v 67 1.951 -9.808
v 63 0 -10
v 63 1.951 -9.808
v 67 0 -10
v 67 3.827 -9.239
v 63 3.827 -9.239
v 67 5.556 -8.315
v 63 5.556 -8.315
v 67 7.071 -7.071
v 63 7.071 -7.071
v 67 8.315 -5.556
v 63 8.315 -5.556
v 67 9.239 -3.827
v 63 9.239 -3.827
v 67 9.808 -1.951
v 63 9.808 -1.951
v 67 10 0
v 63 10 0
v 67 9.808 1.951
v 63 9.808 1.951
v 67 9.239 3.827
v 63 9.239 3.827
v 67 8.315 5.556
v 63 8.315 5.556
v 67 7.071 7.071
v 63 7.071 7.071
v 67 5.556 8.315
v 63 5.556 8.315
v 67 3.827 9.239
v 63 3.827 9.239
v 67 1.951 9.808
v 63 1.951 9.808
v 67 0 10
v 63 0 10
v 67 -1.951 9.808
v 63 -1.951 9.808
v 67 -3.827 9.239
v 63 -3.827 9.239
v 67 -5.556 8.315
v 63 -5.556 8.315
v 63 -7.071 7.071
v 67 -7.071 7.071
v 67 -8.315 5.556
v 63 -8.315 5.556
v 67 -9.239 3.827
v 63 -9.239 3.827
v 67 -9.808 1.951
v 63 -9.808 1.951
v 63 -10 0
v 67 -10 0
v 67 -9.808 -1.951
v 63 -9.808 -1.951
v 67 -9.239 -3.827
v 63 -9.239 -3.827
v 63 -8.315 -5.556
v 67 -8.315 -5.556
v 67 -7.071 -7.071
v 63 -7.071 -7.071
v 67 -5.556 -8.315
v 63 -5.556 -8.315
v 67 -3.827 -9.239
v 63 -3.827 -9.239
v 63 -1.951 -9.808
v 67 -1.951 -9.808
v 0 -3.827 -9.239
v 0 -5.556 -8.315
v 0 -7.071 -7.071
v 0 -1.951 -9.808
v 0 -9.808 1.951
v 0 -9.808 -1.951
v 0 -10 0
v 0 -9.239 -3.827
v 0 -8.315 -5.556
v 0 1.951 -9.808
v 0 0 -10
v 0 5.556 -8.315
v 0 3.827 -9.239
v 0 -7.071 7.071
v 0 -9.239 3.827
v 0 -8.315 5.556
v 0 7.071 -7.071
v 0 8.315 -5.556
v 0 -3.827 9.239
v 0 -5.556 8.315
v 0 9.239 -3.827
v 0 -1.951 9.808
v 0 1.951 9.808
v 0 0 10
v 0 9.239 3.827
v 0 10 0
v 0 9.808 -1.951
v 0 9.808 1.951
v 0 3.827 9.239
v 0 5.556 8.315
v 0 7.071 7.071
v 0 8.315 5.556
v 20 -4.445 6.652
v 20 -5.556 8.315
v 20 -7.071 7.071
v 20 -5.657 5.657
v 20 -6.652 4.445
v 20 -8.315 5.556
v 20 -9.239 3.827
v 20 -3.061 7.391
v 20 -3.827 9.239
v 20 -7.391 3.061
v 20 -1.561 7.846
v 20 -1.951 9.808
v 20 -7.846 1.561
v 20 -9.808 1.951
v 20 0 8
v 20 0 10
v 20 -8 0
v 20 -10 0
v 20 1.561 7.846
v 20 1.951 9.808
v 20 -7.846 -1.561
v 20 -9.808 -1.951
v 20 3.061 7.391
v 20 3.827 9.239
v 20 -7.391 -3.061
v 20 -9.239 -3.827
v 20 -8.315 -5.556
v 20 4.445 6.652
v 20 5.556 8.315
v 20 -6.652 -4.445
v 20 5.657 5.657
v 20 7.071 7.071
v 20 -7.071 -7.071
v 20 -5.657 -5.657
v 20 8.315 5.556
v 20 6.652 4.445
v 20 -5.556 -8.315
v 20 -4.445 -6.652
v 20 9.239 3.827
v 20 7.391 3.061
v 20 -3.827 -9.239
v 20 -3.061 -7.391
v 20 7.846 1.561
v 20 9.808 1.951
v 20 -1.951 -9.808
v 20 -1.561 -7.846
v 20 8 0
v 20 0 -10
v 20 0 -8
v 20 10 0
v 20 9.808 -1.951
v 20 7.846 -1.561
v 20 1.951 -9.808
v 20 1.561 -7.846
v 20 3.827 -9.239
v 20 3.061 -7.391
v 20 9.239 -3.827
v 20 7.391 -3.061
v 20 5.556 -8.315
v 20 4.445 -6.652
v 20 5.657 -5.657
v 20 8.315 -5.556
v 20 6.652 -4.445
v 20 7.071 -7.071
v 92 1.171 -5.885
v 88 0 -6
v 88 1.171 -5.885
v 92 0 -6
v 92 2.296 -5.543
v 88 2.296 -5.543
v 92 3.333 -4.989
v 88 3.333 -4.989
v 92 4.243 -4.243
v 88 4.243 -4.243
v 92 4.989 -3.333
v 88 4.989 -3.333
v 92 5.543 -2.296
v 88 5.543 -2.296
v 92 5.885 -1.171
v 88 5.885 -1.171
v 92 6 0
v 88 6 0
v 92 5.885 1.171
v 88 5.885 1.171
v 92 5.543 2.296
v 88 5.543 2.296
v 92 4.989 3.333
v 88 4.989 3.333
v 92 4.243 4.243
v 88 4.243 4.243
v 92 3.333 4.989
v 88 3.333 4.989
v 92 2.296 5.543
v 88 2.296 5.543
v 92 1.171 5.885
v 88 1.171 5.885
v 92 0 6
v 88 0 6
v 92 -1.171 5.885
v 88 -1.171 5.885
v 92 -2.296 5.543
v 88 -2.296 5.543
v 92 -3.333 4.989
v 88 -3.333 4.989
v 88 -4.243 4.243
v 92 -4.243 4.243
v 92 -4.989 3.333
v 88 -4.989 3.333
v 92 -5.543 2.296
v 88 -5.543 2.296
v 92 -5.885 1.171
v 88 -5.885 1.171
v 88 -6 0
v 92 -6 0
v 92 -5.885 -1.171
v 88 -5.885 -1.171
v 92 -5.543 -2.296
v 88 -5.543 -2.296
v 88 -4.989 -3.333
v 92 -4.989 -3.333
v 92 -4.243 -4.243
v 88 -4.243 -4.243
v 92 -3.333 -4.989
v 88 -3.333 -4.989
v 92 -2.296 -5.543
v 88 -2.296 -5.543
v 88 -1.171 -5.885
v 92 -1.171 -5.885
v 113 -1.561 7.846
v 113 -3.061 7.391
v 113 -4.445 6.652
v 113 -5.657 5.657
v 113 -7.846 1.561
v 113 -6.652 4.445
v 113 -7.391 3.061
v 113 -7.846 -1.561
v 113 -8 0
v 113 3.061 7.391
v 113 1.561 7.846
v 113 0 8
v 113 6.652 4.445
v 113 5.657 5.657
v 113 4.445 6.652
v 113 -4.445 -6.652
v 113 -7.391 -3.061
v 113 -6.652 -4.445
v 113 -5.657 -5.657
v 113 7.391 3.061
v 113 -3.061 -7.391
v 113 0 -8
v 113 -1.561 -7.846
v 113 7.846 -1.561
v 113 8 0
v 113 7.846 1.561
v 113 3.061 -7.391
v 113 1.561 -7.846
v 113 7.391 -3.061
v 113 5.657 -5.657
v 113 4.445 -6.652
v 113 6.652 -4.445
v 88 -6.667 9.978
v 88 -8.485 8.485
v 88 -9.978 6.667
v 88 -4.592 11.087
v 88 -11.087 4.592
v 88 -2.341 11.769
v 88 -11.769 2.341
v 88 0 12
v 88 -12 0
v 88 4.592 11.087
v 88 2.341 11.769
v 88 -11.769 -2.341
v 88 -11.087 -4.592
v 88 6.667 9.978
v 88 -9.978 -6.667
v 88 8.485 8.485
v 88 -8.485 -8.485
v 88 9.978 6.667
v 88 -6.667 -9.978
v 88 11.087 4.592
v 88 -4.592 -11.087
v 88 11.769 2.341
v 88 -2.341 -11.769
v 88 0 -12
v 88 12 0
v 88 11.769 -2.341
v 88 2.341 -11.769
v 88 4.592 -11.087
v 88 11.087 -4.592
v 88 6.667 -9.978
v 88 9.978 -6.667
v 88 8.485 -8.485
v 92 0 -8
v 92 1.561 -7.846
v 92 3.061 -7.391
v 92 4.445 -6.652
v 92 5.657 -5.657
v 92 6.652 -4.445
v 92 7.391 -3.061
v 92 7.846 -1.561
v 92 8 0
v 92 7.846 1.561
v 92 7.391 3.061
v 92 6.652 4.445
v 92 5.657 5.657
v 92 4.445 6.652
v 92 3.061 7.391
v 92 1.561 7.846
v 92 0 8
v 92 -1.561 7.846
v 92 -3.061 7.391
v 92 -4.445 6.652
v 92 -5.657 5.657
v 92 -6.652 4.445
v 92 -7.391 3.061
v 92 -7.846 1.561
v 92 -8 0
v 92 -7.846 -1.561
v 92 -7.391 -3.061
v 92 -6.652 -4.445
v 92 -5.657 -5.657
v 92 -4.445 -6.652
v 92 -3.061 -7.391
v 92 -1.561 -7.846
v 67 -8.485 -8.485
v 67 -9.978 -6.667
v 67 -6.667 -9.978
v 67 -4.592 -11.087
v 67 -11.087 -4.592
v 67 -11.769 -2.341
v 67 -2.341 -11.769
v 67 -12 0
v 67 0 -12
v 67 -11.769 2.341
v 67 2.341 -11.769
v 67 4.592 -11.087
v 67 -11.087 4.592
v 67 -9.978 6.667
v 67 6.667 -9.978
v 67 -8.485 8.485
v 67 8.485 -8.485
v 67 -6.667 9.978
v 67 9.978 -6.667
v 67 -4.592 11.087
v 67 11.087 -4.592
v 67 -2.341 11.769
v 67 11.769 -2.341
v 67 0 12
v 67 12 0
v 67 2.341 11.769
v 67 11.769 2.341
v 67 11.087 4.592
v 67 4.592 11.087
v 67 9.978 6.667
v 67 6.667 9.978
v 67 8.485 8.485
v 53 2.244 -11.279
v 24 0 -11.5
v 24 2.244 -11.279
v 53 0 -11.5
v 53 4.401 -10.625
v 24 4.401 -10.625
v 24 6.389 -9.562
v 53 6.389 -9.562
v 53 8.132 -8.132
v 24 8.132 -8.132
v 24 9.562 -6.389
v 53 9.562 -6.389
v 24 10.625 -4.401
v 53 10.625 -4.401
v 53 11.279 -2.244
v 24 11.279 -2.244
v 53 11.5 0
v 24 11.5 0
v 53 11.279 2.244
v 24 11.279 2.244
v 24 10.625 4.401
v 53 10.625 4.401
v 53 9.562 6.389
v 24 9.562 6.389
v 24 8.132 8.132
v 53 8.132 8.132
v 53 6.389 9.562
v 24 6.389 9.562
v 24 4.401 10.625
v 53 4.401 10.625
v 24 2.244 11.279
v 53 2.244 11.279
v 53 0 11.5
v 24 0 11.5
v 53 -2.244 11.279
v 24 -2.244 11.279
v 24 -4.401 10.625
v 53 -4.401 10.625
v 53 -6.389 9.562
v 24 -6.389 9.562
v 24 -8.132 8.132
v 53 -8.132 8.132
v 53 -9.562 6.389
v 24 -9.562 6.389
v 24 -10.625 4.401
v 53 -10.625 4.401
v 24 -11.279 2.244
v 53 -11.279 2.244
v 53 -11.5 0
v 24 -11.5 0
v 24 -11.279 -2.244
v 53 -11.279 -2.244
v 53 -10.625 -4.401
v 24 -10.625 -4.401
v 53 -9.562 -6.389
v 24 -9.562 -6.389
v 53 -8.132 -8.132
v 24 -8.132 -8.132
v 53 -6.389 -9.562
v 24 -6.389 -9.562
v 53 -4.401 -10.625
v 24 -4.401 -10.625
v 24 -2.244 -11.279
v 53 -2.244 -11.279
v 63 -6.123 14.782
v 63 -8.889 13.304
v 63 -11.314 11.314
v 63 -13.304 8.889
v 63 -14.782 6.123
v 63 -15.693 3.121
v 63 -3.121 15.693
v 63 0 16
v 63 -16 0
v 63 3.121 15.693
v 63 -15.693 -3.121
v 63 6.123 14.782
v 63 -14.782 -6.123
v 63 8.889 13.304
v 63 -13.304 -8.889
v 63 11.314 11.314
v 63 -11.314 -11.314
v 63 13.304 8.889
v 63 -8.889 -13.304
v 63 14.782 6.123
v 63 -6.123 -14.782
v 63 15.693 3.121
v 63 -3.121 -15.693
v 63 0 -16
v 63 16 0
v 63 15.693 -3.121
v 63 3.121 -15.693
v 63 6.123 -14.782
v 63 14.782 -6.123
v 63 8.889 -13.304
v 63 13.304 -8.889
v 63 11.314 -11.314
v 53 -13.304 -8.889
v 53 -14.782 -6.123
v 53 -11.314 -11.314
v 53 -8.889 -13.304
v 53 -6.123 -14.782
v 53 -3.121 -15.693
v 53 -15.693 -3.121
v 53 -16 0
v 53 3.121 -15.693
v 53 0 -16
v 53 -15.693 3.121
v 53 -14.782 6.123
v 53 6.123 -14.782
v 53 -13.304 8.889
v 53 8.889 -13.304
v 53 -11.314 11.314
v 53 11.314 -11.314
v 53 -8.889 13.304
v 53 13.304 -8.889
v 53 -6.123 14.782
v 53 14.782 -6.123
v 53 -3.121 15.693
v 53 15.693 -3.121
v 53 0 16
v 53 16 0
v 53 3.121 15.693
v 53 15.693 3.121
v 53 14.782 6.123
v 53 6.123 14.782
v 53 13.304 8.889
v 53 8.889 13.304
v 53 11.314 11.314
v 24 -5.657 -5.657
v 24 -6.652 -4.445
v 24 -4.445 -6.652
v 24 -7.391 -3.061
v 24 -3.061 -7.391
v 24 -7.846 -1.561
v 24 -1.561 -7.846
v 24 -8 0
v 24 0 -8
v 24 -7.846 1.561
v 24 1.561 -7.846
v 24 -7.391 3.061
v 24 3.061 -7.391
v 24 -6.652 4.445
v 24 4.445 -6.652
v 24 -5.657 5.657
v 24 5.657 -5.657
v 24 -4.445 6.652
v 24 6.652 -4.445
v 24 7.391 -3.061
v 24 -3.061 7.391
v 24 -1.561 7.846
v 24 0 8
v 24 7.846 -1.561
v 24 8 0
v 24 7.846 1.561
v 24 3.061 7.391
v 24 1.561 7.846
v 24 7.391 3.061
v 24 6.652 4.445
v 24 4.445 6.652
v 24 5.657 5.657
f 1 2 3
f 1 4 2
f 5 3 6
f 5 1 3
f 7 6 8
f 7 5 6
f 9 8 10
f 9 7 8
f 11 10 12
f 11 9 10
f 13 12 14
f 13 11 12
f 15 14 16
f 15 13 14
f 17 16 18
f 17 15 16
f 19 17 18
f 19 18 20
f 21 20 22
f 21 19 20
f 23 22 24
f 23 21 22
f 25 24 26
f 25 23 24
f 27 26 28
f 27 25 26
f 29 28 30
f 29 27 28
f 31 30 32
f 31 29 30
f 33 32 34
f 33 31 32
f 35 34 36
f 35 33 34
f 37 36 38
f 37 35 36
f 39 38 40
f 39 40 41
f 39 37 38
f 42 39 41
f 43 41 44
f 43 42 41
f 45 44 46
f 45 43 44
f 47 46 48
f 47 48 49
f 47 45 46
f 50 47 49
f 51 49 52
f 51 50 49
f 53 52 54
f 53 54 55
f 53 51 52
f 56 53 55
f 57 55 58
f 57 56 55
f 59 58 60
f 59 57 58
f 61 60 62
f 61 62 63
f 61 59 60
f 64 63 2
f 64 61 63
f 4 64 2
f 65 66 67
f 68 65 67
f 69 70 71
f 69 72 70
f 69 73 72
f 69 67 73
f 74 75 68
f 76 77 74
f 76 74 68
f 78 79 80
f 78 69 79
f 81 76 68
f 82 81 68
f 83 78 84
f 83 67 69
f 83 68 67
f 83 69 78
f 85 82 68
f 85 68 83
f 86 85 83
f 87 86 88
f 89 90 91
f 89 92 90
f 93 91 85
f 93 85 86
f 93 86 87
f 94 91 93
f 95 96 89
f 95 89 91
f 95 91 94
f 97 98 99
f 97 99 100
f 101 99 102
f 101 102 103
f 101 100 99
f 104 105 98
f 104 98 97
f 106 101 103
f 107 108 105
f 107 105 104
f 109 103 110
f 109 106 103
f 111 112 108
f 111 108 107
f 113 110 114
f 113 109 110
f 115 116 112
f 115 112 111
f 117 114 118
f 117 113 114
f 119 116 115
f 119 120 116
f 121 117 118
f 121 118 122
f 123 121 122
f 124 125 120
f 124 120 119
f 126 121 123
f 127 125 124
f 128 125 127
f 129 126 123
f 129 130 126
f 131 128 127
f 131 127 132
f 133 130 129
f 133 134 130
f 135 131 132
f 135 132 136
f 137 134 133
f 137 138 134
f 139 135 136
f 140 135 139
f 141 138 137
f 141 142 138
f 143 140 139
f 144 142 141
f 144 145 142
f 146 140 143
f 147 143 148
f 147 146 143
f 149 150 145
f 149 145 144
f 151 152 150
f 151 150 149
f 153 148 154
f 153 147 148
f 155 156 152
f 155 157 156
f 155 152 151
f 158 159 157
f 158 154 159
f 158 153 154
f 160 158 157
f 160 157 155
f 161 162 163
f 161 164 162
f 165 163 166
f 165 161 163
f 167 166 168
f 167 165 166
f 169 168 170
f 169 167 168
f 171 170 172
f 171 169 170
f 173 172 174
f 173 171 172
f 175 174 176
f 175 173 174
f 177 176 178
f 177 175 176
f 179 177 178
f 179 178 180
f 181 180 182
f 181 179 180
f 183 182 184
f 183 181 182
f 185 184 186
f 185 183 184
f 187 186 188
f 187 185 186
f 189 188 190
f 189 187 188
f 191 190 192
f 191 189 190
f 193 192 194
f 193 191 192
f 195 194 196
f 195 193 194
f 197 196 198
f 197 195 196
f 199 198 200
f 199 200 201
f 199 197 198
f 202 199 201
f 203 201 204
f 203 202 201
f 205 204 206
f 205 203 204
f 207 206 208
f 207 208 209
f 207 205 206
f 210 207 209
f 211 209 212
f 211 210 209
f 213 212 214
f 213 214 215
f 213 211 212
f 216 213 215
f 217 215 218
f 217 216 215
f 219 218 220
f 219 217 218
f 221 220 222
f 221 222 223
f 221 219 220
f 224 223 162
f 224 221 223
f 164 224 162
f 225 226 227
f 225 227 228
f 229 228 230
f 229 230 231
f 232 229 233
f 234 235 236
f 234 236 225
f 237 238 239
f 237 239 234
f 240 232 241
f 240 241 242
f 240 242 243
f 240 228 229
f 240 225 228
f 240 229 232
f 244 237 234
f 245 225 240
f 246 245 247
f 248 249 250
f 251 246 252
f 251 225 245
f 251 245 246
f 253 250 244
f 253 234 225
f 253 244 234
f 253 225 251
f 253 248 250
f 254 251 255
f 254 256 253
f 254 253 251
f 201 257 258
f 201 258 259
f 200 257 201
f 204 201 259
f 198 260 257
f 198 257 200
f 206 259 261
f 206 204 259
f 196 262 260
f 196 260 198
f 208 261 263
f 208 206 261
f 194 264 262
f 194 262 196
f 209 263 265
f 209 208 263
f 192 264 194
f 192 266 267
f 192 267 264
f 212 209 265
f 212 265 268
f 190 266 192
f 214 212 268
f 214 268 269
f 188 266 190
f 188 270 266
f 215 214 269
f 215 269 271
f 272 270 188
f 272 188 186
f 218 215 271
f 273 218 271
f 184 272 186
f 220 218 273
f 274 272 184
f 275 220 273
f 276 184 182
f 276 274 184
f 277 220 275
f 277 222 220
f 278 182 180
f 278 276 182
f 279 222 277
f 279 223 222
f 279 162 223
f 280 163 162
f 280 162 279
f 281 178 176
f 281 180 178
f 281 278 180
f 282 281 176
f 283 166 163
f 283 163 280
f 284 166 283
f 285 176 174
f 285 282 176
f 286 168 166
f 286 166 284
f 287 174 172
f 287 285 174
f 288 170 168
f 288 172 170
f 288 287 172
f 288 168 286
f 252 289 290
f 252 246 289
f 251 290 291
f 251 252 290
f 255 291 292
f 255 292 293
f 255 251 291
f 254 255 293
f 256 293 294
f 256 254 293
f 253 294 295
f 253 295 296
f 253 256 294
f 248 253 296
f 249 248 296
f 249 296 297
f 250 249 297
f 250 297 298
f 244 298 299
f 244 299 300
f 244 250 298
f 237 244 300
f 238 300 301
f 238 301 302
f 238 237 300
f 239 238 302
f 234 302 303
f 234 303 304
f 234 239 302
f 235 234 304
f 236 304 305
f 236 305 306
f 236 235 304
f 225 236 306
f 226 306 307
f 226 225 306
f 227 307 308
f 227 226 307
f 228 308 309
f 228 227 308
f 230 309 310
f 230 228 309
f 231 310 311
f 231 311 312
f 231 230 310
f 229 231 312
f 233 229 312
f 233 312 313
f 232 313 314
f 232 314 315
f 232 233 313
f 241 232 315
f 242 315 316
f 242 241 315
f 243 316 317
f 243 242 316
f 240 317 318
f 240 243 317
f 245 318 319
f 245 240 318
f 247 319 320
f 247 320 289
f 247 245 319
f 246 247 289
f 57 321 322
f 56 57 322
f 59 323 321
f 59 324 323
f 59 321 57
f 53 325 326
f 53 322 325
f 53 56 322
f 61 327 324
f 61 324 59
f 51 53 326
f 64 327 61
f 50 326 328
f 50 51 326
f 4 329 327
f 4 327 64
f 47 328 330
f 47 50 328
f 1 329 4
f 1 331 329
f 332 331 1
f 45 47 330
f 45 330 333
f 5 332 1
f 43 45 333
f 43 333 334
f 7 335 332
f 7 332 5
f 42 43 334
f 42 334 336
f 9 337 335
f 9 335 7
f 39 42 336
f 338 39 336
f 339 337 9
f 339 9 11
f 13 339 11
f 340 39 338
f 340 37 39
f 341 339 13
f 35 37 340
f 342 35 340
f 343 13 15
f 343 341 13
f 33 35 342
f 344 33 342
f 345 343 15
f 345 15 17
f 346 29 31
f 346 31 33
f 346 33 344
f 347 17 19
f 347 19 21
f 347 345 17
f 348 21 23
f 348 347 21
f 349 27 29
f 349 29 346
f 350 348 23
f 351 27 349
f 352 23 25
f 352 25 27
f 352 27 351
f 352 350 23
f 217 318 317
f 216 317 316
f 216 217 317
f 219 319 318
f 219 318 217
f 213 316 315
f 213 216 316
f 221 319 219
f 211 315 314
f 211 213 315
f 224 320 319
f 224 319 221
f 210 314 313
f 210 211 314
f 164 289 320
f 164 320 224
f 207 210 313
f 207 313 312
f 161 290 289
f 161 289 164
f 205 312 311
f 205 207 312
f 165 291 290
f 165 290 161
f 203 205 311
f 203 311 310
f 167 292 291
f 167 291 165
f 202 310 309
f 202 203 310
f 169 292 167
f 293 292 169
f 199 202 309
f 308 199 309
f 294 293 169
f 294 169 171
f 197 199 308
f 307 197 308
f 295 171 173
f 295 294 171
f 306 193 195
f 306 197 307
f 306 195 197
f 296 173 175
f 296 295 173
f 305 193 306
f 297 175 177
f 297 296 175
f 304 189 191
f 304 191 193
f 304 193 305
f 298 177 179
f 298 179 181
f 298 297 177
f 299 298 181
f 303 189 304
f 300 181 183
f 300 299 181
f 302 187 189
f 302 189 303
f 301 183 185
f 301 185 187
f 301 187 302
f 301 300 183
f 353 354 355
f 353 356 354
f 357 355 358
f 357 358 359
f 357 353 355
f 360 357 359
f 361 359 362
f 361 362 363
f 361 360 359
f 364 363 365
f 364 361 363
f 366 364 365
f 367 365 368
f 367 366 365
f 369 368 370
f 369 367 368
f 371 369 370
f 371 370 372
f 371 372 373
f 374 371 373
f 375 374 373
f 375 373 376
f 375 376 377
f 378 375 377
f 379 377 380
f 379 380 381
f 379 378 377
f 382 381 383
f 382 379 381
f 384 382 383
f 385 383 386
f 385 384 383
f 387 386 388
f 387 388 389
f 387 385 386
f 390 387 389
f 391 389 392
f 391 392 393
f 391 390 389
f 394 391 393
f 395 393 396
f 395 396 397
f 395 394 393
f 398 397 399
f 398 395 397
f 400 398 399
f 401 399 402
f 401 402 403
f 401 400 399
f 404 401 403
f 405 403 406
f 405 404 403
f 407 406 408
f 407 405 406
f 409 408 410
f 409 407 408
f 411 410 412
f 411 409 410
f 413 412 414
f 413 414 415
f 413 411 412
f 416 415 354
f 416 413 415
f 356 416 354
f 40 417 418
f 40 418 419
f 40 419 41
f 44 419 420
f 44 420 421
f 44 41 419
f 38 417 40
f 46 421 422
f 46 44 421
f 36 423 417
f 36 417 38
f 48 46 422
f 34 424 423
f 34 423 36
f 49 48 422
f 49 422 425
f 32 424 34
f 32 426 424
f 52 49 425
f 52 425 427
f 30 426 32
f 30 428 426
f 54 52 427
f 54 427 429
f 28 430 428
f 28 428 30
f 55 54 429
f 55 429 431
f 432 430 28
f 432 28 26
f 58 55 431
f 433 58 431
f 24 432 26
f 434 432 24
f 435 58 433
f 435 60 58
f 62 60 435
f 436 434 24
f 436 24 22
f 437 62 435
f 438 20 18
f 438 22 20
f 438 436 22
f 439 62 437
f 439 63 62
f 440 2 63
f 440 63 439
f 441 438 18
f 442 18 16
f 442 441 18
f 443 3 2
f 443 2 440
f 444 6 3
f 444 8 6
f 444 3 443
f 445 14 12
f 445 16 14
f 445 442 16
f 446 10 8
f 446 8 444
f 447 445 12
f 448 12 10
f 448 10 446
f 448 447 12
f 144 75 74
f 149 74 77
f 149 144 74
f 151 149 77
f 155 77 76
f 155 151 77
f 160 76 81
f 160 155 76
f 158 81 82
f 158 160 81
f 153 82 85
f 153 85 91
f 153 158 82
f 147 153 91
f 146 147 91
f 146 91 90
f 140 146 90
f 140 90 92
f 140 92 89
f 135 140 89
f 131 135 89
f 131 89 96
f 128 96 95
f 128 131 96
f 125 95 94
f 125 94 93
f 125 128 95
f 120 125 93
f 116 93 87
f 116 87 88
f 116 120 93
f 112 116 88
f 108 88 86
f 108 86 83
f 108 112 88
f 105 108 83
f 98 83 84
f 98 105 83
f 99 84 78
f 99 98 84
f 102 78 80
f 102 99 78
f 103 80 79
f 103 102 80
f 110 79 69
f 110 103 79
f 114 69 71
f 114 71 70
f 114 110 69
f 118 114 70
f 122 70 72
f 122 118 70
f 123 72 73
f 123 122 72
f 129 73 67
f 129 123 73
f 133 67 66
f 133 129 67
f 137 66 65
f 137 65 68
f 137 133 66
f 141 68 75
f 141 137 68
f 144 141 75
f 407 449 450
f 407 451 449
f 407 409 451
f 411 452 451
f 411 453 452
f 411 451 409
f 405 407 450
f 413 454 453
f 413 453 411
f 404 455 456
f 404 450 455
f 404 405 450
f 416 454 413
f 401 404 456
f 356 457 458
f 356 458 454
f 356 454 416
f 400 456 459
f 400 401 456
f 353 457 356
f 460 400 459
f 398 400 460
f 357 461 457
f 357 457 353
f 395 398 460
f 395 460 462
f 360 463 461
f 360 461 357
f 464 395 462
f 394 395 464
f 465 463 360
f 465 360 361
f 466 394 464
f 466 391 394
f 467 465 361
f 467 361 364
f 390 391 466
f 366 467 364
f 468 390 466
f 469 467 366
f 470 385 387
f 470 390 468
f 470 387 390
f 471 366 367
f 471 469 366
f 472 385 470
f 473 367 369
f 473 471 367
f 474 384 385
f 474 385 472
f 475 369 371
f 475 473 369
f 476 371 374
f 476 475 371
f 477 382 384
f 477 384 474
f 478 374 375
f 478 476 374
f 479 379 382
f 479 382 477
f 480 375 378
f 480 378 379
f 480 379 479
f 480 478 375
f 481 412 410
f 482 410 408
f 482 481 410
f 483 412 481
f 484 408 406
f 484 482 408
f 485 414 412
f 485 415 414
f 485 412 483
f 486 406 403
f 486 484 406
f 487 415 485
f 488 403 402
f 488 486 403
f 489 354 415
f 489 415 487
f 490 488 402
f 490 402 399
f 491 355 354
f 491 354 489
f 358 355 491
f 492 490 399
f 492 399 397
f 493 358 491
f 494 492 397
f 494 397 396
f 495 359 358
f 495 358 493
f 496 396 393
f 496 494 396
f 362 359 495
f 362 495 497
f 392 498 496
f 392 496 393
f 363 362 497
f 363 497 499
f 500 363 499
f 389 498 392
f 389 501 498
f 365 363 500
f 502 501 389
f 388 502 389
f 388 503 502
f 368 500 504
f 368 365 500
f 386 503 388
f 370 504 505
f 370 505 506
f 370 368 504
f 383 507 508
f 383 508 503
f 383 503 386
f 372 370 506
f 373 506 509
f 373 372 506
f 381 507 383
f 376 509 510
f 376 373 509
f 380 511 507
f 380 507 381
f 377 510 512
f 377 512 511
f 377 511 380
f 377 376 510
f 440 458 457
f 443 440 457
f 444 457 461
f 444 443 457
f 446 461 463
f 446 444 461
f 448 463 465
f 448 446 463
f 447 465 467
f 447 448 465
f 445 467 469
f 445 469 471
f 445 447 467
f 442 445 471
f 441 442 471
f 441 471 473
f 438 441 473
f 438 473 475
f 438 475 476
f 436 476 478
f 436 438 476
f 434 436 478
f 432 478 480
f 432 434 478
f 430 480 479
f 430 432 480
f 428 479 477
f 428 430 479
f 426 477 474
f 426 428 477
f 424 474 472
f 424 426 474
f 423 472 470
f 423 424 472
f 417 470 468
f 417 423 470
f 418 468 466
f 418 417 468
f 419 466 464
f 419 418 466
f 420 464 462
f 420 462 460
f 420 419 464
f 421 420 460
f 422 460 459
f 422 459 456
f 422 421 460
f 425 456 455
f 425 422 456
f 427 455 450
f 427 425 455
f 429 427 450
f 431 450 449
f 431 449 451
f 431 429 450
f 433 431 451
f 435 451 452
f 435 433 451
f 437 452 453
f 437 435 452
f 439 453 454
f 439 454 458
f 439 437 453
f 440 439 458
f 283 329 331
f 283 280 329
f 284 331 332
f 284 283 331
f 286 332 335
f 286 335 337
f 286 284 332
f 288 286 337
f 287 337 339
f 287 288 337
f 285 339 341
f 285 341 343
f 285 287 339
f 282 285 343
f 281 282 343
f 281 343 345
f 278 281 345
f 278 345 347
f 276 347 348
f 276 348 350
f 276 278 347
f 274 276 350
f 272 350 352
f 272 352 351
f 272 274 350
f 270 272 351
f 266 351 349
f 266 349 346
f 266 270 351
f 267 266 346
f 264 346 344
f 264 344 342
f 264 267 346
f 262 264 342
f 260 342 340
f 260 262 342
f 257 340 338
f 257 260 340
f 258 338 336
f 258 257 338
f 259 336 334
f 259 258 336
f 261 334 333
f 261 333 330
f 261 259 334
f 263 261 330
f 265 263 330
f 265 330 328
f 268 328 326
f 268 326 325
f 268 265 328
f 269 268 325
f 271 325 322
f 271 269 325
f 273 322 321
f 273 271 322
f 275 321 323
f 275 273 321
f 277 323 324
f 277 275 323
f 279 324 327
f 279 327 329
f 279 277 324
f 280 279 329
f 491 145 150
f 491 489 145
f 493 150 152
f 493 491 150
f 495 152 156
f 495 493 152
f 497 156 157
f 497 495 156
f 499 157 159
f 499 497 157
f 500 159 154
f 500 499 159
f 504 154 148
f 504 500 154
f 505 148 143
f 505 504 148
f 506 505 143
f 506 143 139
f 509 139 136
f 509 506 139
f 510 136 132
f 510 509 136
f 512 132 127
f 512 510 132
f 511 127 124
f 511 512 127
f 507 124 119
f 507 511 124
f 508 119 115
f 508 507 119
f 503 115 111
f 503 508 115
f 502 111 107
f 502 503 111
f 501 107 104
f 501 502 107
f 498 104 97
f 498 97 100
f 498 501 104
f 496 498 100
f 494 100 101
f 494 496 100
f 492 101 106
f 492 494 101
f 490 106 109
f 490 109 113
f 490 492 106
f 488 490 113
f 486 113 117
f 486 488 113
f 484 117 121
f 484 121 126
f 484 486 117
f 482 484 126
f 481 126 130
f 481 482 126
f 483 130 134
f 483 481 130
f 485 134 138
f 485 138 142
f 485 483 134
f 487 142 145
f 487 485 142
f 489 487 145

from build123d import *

# Parameters (mm, degrees)
F0_W   = 4
F0_H   = 8
F0_H_2 = 10
F0_H_3 = 6


with BuildPart() as f1:
    # F0 (on Front) → F1 (revolve)
    with BuildSketch(Plane.XZ):
        Polygon((20, 0), (0, 0), (0, -10), (20, -10), (20, -8), align=None)
        with Locations((22, -4)):
            Rectangle(F0_W, F0_H)
        Polygon((53, 0), (24, 0), (24, -8), (24, -11.5), (53, -11.5), align=None)
        Polygon((63, 0), (53, 0), (53, -11.5), (53, -16), (63, -16), (63, -10), align=None)
        with Locations((65, -5)):
            Rectangle(F0_W, F0_H_2)
        Polygon((88, 0), (67, 0), (67, -10), (67, -12), (88, -12), (88, -6), align=None)
        with Locations((90, -3)):
            Rectangle(F0_W, F0_H_3)
        Polygon((113, 0), (92, 0), (92, -6), (92, -8), (113, -8), align=None)
    revolve(axis=Axis((38.5, 0, 0), (1, 0, 0)))


solid = f1.part
